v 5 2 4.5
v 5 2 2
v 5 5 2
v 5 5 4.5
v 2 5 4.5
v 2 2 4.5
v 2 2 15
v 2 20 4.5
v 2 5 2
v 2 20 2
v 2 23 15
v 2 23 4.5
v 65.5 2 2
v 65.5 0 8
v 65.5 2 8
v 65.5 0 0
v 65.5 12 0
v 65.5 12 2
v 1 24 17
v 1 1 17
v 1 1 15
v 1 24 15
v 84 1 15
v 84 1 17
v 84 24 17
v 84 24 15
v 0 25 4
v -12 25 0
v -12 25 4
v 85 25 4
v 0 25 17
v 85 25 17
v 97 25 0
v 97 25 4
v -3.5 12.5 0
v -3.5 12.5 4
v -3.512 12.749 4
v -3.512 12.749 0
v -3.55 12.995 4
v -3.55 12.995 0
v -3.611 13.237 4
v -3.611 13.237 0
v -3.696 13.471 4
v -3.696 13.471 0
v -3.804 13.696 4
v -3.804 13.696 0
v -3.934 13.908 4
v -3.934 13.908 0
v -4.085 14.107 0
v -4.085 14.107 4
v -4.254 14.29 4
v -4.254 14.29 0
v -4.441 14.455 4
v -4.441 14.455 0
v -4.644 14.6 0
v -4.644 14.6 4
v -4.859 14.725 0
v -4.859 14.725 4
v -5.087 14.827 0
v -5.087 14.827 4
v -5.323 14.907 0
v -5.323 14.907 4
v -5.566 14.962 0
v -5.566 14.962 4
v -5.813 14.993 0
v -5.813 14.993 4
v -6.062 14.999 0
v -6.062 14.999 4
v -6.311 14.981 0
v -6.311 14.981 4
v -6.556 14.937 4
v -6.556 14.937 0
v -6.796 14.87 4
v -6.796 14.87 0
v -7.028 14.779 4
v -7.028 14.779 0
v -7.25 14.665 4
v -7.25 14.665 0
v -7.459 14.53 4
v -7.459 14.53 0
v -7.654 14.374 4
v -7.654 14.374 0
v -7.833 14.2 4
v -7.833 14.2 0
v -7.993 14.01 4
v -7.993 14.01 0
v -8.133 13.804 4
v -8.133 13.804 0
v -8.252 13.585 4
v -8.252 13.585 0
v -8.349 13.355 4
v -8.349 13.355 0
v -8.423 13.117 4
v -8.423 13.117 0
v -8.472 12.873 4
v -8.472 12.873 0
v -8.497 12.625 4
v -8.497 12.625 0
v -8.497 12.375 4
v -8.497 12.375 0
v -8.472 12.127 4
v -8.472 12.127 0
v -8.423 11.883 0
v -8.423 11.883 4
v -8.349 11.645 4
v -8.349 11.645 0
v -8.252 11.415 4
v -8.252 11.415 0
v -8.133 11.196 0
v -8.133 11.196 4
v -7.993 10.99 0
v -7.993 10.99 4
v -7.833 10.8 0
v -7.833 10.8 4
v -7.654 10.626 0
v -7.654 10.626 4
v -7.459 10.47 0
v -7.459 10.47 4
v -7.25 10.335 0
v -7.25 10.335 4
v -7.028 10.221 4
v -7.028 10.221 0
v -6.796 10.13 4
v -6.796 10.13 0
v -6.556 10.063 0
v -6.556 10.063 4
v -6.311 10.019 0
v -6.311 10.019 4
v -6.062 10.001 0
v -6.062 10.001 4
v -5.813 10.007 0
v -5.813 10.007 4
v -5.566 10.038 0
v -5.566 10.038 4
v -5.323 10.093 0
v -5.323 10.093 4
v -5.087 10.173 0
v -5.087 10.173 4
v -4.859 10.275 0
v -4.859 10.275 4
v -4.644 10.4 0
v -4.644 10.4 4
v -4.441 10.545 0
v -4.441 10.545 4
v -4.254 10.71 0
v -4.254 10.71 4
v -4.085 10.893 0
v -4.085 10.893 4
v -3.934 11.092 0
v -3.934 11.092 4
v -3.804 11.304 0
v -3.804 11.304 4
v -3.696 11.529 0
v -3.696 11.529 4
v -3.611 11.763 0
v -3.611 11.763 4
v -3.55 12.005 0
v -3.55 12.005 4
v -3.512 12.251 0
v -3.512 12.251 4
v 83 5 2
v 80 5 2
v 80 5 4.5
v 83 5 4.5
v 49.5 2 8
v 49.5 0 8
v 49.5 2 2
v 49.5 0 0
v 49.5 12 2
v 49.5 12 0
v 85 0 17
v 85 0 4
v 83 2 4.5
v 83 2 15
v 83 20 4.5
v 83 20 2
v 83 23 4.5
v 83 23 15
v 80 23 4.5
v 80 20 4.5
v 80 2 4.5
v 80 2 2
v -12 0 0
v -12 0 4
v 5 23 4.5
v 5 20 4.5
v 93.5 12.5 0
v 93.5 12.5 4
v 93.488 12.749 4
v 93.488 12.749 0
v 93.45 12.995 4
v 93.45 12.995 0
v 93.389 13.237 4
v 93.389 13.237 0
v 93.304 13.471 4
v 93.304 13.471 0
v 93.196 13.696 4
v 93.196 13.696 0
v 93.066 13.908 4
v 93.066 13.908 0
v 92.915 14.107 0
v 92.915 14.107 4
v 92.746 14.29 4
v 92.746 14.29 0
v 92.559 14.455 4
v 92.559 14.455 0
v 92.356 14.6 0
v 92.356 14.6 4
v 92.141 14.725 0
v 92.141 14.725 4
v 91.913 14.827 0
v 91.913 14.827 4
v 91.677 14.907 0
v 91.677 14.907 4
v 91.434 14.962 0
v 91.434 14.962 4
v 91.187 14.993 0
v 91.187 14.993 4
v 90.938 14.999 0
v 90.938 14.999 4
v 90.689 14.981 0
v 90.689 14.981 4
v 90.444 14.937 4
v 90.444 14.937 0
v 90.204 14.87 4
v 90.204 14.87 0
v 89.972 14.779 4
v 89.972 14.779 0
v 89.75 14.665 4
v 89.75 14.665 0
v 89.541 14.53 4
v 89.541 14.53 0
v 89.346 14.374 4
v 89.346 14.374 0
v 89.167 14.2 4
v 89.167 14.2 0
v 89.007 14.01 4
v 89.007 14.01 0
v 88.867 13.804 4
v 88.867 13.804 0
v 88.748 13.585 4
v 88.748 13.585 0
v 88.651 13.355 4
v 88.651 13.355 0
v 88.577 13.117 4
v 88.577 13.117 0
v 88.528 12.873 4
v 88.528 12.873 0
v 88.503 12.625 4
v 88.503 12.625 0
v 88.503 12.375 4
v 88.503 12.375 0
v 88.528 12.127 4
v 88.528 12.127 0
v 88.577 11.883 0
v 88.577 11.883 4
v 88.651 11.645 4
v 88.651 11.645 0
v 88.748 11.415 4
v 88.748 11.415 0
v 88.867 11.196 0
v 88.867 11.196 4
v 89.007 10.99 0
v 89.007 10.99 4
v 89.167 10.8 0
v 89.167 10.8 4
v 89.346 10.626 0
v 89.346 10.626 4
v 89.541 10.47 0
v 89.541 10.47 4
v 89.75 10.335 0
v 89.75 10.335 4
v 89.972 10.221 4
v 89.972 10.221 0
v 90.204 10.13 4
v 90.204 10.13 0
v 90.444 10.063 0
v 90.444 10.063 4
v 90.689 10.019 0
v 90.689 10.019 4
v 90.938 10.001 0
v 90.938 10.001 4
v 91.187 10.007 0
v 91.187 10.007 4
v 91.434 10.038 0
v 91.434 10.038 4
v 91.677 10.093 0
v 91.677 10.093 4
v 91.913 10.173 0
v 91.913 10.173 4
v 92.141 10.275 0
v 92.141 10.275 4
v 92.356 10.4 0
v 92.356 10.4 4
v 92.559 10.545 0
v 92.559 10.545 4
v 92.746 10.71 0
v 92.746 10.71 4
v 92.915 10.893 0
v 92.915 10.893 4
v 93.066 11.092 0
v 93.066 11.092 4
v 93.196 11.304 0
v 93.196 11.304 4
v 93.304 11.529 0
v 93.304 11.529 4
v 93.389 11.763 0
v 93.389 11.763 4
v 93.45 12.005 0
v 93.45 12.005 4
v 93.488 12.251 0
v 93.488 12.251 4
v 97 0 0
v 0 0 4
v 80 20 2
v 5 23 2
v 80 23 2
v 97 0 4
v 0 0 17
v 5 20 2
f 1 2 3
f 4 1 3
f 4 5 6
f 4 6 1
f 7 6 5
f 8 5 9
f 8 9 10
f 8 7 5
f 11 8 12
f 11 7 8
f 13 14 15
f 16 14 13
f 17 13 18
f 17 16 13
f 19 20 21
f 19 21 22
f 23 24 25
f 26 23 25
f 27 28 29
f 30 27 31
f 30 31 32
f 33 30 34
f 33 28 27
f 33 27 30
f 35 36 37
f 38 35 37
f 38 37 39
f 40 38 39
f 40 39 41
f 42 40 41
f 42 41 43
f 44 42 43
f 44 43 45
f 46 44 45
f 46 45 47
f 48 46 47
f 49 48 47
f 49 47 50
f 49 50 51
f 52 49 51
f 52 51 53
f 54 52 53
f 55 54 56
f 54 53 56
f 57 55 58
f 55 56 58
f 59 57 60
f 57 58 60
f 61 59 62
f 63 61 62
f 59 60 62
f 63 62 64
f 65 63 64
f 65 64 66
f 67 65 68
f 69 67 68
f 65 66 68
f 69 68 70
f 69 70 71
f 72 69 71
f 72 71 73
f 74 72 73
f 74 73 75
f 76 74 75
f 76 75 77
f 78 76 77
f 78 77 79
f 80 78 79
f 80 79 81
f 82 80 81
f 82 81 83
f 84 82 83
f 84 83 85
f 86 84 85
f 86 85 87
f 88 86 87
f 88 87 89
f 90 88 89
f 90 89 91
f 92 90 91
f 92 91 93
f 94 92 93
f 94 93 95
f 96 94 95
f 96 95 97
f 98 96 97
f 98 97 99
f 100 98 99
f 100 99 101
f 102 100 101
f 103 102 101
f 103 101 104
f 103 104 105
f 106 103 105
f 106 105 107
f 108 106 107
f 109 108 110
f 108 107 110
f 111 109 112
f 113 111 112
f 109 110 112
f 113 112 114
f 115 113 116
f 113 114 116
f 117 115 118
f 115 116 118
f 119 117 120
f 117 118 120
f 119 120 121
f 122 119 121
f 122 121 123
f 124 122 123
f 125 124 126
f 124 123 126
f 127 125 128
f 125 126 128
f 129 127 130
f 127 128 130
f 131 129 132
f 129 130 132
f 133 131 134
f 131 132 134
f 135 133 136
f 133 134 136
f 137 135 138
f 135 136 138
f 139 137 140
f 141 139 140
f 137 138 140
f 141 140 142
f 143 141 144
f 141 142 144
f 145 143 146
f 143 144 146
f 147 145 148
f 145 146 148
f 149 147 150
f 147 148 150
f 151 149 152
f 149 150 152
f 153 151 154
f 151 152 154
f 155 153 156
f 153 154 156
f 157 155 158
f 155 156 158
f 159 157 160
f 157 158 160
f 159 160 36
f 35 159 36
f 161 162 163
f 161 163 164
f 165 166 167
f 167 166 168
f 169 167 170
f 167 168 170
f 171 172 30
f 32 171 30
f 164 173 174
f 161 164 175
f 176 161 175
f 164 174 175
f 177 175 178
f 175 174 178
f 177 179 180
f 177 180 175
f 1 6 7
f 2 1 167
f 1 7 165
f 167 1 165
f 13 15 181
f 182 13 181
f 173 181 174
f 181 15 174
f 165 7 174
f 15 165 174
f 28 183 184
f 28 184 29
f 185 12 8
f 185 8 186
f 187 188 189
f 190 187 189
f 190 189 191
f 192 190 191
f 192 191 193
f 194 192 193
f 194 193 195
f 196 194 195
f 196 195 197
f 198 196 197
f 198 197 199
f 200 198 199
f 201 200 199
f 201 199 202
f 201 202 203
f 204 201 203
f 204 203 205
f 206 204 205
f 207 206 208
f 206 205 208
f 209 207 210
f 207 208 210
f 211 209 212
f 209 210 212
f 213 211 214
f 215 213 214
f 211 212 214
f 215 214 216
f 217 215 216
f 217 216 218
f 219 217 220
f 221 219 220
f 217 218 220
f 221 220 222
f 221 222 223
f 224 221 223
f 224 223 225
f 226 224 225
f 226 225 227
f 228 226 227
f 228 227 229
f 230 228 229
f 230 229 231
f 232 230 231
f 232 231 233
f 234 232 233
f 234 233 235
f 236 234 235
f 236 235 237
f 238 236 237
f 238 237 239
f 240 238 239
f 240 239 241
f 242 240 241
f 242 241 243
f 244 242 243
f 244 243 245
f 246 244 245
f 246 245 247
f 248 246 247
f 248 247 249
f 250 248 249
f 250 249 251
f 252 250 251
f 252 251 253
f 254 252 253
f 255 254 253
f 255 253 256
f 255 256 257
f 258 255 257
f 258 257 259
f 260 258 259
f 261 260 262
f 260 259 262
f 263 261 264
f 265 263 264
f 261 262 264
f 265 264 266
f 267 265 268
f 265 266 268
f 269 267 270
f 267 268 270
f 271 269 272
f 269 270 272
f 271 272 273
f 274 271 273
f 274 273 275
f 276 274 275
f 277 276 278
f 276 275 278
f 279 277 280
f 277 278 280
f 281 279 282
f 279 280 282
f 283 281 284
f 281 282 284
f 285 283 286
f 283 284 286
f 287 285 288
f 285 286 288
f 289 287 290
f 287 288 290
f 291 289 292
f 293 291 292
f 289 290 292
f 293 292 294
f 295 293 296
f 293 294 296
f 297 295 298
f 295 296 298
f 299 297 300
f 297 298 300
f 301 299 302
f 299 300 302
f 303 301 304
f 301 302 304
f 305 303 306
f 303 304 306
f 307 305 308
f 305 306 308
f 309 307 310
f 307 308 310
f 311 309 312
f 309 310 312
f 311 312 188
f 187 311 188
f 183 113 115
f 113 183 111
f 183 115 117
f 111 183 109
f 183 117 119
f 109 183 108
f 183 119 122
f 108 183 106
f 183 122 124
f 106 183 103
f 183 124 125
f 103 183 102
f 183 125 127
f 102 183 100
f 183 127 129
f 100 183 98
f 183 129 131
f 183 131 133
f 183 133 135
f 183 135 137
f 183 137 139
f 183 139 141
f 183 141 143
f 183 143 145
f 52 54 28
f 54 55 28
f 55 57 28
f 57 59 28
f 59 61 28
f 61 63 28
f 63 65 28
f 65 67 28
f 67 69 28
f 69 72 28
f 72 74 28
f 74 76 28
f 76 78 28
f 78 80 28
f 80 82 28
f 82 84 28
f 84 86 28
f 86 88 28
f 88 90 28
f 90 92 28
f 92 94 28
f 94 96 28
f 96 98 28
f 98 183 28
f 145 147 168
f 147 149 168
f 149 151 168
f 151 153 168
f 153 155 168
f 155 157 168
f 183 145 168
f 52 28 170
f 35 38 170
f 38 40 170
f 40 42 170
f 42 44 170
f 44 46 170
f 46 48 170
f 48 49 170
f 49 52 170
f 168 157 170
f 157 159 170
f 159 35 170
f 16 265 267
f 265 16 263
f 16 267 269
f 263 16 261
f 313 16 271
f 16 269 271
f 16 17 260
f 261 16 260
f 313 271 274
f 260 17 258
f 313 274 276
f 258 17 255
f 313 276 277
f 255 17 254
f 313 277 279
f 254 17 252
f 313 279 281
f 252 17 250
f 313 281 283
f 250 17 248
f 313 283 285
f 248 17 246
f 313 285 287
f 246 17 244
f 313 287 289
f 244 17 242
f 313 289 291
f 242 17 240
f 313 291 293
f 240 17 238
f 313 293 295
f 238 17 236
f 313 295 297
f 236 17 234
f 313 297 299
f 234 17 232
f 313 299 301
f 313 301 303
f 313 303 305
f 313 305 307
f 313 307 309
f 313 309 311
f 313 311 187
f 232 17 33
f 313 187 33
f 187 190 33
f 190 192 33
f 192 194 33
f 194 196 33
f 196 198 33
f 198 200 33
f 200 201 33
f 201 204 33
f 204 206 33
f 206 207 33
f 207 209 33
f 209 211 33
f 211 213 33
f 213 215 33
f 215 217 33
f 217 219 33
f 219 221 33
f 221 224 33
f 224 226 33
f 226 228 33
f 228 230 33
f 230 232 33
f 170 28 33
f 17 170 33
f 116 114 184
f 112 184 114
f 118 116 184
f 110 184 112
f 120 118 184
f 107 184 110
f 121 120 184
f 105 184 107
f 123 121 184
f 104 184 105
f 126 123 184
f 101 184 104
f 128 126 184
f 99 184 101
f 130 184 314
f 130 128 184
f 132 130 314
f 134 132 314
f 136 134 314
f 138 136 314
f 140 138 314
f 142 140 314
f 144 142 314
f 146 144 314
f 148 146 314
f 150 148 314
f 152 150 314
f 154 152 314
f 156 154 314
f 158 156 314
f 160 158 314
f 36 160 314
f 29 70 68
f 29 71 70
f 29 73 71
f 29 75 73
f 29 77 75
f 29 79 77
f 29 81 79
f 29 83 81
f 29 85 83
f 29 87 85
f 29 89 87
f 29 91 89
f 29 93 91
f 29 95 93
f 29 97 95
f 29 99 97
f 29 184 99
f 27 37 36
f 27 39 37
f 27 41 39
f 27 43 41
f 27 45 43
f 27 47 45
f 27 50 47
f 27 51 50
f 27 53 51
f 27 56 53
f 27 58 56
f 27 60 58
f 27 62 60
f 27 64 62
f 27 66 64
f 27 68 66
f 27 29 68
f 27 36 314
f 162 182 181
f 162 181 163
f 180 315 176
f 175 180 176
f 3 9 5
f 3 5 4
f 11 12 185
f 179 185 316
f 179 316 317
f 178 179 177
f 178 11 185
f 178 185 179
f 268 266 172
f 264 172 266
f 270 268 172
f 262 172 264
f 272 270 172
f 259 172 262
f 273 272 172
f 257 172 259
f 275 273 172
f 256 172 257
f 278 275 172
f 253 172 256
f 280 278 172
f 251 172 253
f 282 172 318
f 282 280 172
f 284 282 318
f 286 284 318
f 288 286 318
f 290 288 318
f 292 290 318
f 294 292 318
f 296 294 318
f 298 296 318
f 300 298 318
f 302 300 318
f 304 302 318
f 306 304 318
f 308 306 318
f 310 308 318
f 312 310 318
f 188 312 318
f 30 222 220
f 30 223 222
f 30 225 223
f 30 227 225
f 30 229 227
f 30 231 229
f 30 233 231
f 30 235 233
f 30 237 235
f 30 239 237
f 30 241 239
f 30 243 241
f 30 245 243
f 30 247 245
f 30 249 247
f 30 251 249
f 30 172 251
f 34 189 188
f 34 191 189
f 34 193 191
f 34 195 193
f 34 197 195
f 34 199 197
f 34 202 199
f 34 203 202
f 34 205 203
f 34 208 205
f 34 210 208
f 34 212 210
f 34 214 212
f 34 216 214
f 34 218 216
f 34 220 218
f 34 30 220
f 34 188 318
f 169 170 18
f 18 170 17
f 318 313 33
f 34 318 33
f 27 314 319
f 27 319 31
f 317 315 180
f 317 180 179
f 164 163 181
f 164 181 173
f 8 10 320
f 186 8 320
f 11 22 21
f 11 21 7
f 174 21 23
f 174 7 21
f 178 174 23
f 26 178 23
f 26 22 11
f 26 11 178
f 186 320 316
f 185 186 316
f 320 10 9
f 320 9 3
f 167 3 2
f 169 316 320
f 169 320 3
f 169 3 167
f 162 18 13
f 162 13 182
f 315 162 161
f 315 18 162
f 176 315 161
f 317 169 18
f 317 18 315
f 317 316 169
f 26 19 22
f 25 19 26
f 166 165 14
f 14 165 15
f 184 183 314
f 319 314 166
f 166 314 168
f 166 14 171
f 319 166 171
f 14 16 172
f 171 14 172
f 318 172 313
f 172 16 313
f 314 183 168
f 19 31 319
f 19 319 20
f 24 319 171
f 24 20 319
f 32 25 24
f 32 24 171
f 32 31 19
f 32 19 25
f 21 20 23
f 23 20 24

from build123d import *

# Parameters (mm, degrees)
SKETCH_W        = 85
SKETCH_H        = 25
PAD_DEPTH       = 17
SKETCH001_W     = 81
SKETCH001_H     = 21
POCKET_DEPTH    = 15
SKETCH002_W     = 16
SKETCH002_H     = 12
POCKET001_DEPTH = 8
SKETCH003_W     = 83
SKETCH003_H     = 23
POCKET002_DEPTH = 2
SKETCH004_W     = 5
SKETCH004_H     = 5
PAD001_DEPTH    = 2.5
SKETCH008_W     = 12
SKETCH008_H     = 25
PAD004_DEPTH    = 4
SKETCH010_W     = 12
SKETCH010_H     = 25
PAD005_DEPTH    = 4
SKETCH011_R     = 2.5
POCKET004_DEPTH = 4.001
SKETCH012_R     = 2.5
POCKET005_DEPTH = 4.001


with BuildPart() as part:
    # Sketch → Pad (new body)
    with BuildSketch(Plane.XY):
        with Locations((42.5, 12.5)):
            Rectangle(SKETCH_W, SKETCH_H)
    extrude(amount=PAD_DEPTH)

    # Sketch001 (on Face6 of Pad) → Pocket (cut)
    with BuildSketch(Plane.XY.offset(17)):
        with Locations((42.5, 12.5)):
            Rectangle(SKETCH001_W, SKETCH001_H)
    extrude(amount=-POCKET_DEPTH, mode=Mode.SUBTRACT)

    # Sketch002 → Pocket001 (cut)
    with BuildSketch(Plane.XY):
        with Locations((57.5, 6)):
            Rectangle(SKETCH002_W, SKETCH002_H)
    extrude(amount=POCKET001_DEPTH, mode=Mode.SUBTRACT)

    # Sketch003 (on Face7 of Pocket001) → Pocket002 (cut)
    with BuildSketch(Plane.XY.offset(17)):
        with Locations((42.5, 12.5)):
            Rectangle(SKETCH003_W, SKETCH003_H)
    extrude(amount=-POCKET002_DEPTH, mode=Mode.SUBTRACT)

    # Sketch004 (on Face12 of Pocket002) → Pad001 (join)
    with BuildSketch(Plane.XY.offset(2)):
        with Locations((2.5, 2.5)):
            Rectangle(SKETCH004_W, SKETCH004_H)
        with Locations((2.5, 22.5)):
            Rectangle(SKETCH004_W, SKETCH004_H)
        with Locations((82.5, 2.5)):
            Rectangle(SKETCH004_W, SKETCH004_H)
        with Locations((82.5, 22.5)):
            Rectangle(SKETCH004_W, SKETCH004_H)
    extrude(amount=PAD001_DEPTH)

    # Sketch008 → Pad004 (join)
    with BuildSketch(Plane.XY):
        with Locations((-6, 12.5)):
            Rectangle(SKETCH008_W, SKETCH008_H)
    extrude(amount=PAD004_DEPTH)

    # Sketch010 → Pad005 (join)
    with BuildSketch(Plane.XY):
        with Locations((91, 12.5)):
            Rectangle(SKETCH010_W, SKETCH010_H)
    extrude(amount=PAD005_DEPTH)

    # Sketch011 (on Face27 of Pad005) → Pocket004 (cut, through all)
    with BuildSketch(Plane.XY.offset(4)):
        with Locations((-6, 12.5)):
            Circle(SKETCH011_R)
    extrude(amount=-POCKET004_DEPTH, mode=Mode.SUBTRACT)

    # Sketch012 (on Face20 of Pocket004) → Pocket005 (cut, through all)
    with BuildSketch(Plane.XY.offset(4)):
        with Locations((91, 12.5)):
            Circle(SKETCH012_R)
    extrude(amount=-POCKET005_DEPTH, mode=Mode.SUBTRACT)


solid = part.part
